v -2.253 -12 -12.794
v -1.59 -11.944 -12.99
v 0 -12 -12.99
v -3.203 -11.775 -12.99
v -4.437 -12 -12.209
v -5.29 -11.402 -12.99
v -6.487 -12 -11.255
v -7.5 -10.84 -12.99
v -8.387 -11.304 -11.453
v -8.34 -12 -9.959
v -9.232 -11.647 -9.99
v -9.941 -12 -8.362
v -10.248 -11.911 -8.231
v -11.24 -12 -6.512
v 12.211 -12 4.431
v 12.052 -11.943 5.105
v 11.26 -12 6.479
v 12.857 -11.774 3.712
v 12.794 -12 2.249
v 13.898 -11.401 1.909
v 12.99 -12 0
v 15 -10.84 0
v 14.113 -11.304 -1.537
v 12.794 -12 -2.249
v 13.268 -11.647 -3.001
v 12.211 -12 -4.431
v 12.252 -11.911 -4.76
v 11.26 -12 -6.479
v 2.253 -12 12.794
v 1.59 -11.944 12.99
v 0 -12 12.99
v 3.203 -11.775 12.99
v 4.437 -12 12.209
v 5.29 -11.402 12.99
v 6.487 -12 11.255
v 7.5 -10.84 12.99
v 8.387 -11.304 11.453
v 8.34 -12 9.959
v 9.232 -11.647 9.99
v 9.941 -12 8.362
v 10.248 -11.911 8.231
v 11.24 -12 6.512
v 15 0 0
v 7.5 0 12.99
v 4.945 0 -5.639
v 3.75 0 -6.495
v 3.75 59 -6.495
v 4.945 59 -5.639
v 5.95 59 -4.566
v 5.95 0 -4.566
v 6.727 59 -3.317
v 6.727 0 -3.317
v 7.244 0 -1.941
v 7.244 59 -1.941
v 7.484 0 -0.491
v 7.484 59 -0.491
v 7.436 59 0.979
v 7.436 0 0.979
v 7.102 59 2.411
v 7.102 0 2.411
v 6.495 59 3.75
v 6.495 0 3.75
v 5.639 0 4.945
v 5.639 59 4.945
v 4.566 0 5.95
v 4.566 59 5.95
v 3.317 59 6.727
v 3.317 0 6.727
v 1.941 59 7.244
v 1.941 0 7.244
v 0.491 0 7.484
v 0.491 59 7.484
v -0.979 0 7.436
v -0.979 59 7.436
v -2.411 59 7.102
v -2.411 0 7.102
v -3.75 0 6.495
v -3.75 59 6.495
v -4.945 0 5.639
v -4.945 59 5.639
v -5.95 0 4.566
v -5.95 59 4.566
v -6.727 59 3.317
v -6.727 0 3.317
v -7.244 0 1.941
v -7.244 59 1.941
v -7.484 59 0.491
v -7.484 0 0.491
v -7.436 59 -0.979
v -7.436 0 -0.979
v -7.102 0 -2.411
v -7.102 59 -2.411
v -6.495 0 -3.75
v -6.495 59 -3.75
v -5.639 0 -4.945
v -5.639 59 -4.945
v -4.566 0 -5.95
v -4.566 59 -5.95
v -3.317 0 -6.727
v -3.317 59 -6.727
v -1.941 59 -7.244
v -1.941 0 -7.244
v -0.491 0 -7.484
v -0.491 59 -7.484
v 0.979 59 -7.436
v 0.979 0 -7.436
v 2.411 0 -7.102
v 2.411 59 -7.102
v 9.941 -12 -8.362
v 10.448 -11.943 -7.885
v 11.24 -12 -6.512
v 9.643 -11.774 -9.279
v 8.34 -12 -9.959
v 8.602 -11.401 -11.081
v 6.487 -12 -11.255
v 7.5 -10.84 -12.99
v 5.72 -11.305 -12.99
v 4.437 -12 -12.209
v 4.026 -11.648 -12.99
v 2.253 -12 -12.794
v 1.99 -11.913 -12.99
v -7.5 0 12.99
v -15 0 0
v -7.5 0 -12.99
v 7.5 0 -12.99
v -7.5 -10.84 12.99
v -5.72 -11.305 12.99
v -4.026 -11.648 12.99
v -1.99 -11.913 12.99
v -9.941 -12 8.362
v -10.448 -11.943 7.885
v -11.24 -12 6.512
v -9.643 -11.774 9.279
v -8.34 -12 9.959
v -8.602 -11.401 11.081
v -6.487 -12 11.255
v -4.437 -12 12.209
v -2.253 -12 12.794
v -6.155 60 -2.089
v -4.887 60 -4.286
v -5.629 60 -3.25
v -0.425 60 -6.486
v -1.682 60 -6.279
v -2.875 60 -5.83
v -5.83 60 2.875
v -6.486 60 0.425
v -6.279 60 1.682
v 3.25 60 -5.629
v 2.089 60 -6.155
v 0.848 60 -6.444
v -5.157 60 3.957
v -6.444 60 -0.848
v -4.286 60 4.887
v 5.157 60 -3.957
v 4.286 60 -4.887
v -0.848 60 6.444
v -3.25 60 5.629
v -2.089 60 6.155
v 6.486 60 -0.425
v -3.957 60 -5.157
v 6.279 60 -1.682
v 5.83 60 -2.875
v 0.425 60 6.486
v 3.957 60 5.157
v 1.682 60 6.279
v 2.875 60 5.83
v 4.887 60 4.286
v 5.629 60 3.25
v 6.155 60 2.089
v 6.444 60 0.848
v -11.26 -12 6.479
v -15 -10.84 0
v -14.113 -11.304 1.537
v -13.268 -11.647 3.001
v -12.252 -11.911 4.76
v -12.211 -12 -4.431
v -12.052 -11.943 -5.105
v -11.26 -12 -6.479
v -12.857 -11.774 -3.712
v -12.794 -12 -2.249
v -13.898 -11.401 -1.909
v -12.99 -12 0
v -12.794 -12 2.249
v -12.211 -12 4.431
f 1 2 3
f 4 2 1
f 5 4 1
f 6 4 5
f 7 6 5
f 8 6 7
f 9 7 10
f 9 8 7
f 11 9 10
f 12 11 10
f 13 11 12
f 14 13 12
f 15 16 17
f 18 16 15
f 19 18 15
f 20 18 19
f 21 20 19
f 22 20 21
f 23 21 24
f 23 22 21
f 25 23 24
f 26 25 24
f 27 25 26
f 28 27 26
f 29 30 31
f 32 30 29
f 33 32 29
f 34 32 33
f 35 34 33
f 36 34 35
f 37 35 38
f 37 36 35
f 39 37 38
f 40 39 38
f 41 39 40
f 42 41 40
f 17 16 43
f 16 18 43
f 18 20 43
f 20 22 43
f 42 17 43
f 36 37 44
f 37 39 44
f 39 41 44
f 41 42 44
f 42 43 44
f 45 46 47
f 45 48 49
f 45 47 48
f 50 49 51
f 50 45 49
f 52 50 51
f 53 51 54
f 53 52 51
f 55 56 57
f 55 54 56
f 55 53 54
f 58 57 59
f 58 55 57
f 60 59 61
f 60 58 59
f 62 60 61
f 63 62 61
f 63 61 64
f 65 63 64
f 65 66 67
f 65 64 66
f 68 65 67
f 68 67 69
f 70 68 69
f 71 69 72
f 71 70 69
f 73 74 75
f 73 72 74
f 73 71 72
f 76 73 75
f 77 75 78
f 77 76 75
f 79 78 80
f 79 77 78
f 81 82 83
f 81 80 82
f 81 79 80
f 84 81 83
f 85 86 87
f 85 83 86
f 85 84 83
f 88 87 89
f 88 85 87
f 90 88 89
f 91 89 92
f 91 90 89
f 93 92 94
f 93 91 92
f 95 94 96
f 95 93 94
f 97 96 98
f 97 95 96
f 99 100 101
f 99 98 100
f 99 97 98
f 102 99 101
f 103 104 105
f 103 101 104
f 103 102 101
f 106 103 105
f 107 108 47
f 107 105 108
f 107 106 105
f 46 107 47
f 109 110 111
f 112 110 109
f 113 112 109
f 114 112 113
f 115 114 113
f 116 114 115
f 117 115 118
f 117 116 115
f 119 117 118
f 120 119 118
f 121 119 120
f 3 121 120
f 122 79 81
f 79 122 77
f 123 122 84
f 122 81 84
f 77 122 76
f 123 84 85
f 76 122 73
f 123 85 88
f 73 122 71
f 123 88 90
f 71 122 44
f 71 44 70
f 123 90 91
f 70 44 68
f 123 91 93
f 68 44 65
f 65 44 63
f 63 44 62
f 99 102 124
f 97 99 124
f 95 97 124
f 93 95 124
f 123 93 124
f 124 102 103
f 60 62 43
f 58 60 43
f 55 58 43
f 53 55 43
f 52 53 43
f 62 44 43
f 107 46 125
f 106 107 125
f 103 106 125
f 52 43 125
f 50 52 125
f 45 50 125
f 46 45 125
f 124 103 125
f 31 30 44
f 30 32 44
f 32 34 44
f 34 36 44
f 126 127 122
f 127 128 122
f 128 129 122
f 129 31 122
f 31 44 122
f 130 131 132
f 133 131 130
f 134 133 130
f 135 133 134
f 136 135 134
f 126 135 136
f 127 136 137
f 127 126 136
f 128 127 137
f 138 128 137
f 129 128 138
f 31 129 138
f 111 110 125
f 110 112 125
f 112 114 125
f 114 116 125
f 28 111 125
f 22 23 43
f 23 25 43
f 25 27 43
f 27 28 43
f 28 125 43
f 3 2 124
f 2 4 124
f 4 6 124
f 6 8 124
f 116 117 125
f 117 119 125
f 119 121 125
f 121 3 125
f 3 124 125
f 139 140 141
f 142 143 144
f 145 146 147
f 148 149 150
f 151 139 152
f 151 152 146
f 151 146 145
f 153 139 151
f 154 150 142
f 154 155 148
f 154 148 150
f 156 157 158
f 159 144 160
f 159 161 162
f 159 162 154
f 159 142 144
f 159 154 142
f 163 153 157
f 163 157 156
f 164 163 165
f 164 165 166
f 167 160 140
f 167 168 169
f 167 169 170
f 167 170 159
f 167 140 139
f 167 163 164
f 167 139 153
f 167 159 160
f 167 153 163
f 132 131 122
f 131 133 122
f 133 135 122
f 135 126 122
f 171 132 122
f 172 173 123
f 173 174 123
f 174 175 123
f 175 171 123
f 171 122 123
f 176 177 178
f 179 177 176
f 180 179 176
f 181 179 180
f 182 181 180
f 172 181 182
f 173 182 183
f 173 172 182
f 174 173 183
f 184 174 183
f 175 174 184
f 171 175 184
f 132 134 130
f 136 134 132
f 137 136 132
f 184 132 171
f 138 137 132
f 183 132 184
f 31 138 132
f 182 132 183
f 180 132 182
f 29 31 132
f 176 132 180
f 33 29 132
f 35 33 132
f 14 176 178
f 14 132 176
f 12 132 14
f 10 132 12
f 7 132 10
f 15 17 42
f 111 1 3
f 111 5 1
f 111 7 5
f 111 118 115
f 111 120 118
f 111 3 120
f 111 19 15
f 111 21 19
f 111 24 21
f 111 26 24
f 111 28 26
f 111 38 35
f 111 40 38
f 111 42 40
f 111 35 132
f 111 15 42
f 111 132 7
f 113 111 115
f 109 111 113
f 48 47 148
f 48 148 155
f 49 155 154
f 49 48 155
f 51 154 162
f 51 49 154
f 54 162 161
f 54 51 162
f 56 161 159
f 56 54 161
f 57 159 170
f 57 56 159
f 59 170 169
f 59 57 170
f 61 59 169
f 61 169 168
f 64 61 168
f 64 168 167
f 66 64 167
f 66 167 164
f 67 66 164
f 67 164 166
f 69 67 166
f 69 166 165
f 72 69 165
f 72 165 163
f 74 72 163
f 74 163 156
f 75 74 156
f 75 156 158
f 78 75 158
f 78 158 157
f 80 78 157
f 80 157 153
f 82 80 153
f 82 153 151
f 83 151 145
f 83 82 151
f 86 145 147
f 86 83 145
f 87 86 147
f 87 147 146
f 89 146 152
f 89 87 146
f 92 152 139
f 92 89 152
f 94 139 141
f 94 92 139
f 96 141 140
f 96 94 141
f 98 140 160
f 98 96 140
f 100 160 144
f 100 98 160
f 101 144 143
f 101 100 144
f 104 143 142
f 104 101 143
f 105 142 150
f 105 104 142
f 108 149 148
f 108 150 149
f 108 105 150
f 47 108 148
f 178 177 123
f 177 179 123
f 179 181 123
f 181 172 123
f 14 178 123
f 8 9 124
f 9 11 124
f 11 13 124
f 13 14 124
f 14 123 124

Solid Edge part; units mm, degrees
sketch "Sketch1" plane through (0, 0, 0) normal (0, -1, 0) x (1, 0, 0)
  line L0 (-7.5, -12.9904) -> (7.5, -12.9904)
  line L1 (7.5, -12.9904) -> (15, 0)
  line L2 (15, 0) -> (7.5, 12.9904)
  line L3 (7.5, 12.9904) -> (-7.5, 12.9904)
  line L4 (-7.5, 12.9904) -> (-15, 0)
  line L5 (-15, 0) -> (-7.5, -12.9904)
extrude "Protrusion1" add sketch "Sketch1" along normal blind 12
sketch "Sketch2" plane through (0, 0, 0) normal (0, 1, 0) x (0.5, 0, -0.866)
  circle A0 centre (0, 0) radius 7.5
extrude "ExtrudedProtrusion_2" add sketch "Sketch2" along normal blind 60
chamfer "Chamfer_1" distance 1 angle 45 1 edges at (-3.75, 60, 6.4952)
sketch "Sketch3" plane through (0, 0, 0) normal (1, 0, 0) x (0, 1, 0)
  line L0 (-12, -12.9904) -> (1.6235, -36.587)
revolve "RevolvedCutout1" cut sketch "Sketch3" angle 360 about axis through (0, -60, 0) along (0, 1, 0) material side at (0, -5.2316, -24.8137)
cosmetic_thread "Thread_2" size "M15" thread depth 30
properties part number "4" material "Fe - 410 W"
